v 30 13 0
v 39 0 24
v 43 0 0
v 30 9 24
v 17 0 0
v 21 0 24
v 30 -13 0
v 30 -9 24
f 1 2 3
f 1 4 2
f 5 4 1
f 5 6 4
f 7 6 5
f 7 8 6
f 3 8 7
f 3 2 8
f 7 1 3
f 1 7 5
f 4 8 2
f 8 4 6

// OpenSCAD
$fn = 90;

one();


!translate([30, 0, 0]) cylinder(d2 = 18, d1 = 26, h = 24,$fn = 4);

module one() {
    difference() {
        translate([0, 0, 0]) {
            sphere(d = 24);
            translate([0, 0, -7]) cube([24, 24, 3], true);
        }
        translate([0, 0, -13.5]) cube([24, 24, 10], true);
    }
}
